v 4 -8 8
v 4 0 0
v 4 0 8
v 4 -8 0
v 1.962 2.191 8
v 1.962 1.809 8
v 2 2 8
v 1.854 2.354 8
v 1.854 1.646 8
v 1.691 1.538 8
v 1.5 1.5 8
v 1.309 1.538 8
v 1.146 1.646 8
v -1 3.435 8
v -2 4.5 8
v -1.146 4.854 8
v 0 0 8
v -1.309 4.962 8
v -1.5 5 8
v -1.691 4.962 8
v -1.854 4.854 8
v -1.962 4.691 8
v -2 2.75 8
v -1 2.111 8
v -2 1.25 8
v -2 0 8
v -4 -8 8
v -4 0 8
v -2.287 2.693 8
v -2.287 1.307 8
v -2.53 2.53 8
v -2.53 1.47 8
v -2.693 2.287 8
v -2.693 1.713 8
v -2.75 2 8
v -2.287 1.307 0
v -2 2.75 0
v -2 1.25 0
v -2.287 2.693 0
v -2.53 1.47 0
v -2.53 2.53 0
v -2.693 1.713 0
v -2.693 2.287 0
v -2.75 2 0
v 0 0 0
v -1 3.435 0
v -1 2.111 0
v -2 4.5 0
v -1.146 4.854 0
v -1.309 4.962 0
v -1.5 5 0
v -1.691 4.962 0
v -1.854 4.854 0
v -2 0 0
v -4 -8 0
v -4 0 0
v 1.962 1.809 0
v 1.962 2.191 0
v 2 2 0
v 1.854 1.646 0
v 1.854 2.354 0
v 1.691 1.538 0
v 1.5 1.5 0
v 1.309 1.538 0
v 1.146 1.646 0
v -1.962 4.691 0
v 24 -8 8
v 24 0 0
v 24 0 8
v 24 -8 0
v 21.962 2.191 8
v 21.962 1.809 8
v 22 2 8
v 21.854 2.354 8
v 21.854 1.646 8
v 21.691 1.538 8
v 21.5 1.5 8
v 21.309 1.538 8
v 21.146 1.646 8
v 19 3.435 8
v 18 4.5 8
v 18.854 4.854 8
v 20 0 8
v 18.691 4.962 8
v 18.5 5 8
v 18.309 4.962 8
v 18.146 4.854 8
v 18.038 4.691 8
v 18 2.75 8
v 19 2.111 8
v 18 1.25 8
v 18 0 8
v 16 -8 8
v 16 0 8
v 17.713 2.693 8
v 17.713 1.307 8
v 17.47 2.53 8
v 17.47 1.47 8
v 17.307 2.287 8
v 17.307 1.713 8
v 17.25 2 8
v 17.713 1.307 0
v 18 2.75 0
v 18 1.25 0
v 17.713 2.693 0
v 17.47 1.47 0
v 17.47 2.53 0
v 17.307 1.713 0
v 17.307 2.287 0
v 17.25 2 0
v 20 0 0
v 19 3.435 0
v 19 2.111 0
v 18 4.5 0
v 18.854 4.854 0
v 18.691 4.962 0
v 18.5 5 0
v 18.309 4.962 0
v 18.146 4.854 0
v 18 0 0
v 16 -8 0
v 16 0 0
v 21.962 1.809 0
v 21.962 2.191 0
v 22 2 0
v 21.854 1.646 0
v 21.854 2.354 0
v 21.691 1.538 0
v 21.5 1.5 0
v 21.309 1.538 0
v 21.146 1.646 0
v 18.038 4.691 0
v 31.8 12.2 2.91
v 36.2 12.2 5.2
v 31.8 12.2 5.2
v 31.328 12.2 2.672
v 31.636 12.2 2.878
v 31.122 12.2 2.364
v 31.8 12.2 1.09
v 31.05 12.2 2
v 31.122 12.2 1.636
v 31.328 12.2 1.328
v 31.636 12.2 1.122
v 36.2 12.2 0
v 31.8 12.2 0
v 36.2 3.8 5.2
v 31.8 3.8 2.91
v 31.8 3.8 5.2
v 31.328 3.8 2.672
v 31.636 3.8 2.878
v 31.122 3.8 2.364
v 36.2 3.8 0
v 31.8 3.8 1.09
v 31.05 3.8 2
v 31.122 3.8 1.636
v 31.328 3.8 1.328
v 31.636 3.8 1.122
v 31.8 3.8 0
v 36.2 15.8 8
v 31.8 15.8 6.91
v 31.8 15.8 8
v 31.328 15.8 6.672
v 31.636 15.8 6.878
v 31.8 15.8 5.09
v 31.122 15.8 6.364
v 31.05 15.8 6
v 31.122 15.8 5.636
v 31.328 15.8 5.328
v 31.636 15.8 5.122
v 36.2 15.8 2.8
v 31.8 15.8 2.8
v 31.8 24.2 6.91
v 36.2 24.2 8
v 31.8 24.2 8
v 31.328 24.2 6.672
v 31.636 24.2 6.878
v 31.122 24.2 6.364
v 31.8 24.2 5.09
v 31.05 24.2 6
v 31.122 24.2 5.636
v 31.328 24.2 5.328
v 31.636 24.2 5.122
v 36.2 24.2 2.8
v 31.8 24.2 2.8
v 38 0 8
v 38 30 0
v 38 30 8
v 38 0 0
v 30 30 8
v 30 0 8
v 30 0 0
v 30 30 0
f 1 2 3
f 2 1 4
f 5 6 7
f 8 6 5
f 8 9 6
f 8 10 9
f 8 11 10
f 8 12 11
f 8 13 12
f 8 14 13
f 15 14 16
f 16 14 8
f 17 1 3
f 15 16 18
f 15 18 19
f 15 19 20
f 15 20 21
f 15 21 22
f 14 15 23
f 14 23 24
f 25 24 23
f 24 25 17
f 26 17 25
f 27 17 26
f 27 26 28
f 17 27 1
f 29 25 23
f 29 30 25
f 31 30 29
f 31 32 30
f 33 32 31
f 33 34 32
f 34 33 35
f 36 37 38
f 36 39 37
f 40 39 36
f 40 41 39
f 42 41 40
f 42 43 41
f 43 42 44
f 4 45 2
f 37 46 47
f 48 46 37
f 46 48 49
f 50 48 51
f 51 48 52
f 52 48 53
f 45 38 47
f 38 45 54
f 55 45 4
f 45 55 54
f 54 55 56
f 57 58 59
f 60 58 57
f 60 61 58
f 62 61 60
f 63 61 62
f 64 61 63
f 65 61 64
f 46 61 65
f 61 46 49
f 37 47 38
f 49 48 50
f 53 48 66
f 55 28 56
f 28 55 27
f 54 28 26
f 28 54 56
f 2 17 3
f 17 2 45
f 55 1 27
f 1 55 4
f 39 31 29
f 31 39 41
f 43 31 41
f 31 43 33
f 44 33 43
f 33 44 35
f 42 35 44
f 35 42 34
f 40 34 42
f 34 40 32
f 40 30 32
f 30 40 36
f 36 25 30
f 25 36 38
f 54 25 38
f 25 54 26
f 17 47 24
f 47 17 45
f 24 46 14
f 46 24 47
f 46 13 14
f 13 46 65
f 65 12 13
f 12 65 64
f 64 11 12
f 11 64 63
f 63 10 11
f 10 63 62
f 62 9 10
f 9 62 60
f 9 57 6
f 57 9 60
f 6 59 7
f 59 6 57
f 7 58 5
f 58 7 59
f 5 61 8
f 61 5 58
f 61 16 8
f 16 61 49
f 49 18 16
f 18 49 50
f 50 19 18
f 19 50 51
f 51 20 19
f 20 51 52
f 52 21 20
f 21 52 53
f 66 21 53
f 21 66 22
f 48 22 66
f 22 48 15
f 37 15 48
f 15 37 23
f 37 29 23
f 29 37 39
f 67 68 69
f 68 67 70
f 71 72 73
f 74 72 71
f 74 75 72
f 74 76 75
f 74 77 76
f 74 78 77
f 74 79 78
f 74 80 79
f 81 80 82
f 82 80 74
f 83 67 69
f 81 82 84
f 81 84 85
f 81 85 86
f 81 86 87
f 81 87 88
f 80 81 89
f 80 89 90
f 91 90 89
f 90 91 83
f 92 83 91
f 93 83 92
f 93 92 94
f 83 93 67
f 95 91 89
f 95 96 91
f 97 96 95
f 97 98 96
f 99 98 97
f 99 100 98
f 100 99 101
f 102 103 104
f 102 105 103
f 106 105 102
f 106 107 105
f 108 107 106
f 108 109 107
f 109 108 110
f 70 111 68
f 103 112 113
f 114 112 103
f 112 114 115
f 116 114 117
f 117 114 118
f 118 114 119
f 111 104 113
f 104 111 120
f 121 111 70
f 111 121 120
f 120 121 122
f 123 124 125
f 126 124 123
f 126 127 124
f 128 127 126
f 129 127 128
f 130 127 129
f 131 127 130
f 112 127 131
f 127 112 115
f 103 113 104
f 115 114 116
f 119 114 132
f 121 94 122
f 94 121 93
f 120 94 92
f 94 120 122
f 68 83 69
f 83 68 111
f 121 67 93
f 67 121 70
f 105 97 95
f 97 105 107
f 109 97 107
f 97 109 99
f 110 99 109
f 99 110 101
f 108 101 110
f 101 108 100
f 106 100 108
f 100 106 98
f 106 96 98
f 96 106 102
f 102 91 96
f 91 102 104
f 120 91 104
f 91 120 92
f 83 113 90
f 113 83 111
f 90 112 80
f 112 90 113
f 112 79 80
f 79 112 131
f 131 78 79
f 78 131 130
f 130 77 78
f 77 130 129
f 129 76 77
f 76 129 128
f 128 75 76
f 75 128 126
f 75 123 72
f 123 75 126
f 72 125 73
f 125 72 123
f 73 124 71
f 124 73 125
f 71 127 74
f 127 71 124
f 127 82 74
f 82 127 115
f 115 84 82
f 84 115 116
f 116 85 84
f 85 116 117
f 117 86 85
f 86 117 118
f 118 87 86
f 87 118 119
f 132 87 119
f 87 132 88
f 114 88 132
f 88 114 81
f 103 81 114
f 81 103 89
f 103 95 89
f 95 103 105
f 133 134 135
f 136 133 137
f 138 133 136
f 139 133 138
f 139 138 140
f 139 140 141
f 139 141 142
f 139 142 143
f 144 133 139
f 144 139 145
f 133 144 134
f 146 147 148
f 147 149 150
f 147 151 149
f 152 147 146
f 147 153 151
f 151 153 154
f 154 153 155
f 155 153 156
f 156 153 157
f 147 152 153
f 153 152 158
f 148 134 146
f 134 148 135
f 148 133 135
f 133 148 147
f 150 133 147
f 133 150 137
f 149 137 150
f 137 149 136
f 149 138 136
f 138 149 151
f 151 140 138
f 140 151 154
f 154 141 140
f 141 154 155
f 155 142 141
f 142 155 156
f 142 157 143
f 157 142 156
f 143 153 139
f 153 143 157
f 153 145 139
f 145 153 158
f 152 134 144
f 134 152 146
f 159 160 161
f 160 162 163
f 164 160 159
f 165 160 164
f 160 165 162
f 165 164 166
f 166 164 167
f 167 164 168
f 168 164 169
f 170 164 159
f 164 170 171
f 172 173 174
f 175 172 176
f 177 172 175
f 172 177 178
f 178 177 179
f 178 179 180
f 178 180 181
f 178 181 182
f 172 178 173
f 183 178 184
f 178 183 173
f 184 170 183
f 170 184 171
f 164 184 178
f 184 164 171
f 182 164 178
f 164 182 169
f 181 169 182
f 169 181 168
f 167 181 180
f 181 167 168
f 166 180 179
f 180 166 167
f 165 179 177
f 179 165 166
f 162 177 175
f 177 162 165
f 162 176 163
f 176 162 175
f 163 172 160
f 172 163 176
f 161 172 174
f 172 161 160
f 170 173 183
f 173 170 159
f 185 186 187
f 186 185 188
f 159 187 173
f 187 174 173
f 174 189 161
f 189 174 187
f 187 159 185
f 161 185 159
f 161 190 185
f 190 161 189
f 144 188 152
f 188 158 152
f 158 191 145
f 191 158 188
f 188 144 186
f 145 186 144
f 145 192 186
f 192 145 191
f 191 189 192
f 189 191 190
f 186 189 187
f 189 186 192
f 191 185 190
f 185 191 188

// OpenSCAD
module hook_profile(w, d, stroke, notch_r, notch_y, base_d)
{
	e=.00001;
	$fn=16;

	translate([-w/2, 0])
		square([stroke, d-stroke/2]);

	hull()
	{
		for (p = [
			[-w/2+stroke/2, d-stroke/2],
			[w/2-stroke/2, notch_y],
		])
			translate(p)
				circle(stroke/2);
	}

	translate([-w/2, notch_y])
		circle(notch_r);

	hull()
	{
		translate([-w/2+stroke/2, notch_y])
			circle(stroke/2);
		translate([-w/2, -base_d])
			square([w/2, base_d]);
	}

	translate([-w/2, -base_d])
		square([w, base_d]);
	
}

module latch_profile(w, d, stroke, notch_r, notch_y, base_d, v_margin)
{
	$fn=16;

	translate([-w/2, notch_y])
		circle(notch_r+v_margin);

	translate([-w/2-v_margin, -base_d+v_margin])
		square([w+2*v_margin, base_d+d]);
}


module hook(h, w, d, stroke, notch_r, notch_y, base_d)
{
	linear_extrude(h)
		hook_profile(w, d, stroke, notch_r, notch_y, base_d);
}

module latch(h, w, d, stroke, notch_r, notch_y, base_d, v_margin, h_margin)
{
	translate([0,0,-h_margin])
		linear_extrude(h+h_margin*2)
			latch_profile(w, d, stroke, notch_r, notch_y, base_d, v_margin);
}

module snap_test()
{

	for (x = [0, 20])
		translate([x,0,0]) 
		{
			translate([-4,-8,0])
				cube([8,8,8]);
			hook(8, 4, 5, 1, .75, 2, 3);
		}

	translate([30,0,0])
		difference()
		{
			cube([8, 30, 8]);
			union()
			{
				translate([4,12,0])
					rotate([90,0,0])
						latch(8, 4, 5, 1, .75, 2, 3, .2, .2);

				translate([4,16,8])
					rotate([-90,0,0])
						latch(8, 4, 5, 1, .75, 2, 3, .2, .2);
			}
	}
}

snap_test();
